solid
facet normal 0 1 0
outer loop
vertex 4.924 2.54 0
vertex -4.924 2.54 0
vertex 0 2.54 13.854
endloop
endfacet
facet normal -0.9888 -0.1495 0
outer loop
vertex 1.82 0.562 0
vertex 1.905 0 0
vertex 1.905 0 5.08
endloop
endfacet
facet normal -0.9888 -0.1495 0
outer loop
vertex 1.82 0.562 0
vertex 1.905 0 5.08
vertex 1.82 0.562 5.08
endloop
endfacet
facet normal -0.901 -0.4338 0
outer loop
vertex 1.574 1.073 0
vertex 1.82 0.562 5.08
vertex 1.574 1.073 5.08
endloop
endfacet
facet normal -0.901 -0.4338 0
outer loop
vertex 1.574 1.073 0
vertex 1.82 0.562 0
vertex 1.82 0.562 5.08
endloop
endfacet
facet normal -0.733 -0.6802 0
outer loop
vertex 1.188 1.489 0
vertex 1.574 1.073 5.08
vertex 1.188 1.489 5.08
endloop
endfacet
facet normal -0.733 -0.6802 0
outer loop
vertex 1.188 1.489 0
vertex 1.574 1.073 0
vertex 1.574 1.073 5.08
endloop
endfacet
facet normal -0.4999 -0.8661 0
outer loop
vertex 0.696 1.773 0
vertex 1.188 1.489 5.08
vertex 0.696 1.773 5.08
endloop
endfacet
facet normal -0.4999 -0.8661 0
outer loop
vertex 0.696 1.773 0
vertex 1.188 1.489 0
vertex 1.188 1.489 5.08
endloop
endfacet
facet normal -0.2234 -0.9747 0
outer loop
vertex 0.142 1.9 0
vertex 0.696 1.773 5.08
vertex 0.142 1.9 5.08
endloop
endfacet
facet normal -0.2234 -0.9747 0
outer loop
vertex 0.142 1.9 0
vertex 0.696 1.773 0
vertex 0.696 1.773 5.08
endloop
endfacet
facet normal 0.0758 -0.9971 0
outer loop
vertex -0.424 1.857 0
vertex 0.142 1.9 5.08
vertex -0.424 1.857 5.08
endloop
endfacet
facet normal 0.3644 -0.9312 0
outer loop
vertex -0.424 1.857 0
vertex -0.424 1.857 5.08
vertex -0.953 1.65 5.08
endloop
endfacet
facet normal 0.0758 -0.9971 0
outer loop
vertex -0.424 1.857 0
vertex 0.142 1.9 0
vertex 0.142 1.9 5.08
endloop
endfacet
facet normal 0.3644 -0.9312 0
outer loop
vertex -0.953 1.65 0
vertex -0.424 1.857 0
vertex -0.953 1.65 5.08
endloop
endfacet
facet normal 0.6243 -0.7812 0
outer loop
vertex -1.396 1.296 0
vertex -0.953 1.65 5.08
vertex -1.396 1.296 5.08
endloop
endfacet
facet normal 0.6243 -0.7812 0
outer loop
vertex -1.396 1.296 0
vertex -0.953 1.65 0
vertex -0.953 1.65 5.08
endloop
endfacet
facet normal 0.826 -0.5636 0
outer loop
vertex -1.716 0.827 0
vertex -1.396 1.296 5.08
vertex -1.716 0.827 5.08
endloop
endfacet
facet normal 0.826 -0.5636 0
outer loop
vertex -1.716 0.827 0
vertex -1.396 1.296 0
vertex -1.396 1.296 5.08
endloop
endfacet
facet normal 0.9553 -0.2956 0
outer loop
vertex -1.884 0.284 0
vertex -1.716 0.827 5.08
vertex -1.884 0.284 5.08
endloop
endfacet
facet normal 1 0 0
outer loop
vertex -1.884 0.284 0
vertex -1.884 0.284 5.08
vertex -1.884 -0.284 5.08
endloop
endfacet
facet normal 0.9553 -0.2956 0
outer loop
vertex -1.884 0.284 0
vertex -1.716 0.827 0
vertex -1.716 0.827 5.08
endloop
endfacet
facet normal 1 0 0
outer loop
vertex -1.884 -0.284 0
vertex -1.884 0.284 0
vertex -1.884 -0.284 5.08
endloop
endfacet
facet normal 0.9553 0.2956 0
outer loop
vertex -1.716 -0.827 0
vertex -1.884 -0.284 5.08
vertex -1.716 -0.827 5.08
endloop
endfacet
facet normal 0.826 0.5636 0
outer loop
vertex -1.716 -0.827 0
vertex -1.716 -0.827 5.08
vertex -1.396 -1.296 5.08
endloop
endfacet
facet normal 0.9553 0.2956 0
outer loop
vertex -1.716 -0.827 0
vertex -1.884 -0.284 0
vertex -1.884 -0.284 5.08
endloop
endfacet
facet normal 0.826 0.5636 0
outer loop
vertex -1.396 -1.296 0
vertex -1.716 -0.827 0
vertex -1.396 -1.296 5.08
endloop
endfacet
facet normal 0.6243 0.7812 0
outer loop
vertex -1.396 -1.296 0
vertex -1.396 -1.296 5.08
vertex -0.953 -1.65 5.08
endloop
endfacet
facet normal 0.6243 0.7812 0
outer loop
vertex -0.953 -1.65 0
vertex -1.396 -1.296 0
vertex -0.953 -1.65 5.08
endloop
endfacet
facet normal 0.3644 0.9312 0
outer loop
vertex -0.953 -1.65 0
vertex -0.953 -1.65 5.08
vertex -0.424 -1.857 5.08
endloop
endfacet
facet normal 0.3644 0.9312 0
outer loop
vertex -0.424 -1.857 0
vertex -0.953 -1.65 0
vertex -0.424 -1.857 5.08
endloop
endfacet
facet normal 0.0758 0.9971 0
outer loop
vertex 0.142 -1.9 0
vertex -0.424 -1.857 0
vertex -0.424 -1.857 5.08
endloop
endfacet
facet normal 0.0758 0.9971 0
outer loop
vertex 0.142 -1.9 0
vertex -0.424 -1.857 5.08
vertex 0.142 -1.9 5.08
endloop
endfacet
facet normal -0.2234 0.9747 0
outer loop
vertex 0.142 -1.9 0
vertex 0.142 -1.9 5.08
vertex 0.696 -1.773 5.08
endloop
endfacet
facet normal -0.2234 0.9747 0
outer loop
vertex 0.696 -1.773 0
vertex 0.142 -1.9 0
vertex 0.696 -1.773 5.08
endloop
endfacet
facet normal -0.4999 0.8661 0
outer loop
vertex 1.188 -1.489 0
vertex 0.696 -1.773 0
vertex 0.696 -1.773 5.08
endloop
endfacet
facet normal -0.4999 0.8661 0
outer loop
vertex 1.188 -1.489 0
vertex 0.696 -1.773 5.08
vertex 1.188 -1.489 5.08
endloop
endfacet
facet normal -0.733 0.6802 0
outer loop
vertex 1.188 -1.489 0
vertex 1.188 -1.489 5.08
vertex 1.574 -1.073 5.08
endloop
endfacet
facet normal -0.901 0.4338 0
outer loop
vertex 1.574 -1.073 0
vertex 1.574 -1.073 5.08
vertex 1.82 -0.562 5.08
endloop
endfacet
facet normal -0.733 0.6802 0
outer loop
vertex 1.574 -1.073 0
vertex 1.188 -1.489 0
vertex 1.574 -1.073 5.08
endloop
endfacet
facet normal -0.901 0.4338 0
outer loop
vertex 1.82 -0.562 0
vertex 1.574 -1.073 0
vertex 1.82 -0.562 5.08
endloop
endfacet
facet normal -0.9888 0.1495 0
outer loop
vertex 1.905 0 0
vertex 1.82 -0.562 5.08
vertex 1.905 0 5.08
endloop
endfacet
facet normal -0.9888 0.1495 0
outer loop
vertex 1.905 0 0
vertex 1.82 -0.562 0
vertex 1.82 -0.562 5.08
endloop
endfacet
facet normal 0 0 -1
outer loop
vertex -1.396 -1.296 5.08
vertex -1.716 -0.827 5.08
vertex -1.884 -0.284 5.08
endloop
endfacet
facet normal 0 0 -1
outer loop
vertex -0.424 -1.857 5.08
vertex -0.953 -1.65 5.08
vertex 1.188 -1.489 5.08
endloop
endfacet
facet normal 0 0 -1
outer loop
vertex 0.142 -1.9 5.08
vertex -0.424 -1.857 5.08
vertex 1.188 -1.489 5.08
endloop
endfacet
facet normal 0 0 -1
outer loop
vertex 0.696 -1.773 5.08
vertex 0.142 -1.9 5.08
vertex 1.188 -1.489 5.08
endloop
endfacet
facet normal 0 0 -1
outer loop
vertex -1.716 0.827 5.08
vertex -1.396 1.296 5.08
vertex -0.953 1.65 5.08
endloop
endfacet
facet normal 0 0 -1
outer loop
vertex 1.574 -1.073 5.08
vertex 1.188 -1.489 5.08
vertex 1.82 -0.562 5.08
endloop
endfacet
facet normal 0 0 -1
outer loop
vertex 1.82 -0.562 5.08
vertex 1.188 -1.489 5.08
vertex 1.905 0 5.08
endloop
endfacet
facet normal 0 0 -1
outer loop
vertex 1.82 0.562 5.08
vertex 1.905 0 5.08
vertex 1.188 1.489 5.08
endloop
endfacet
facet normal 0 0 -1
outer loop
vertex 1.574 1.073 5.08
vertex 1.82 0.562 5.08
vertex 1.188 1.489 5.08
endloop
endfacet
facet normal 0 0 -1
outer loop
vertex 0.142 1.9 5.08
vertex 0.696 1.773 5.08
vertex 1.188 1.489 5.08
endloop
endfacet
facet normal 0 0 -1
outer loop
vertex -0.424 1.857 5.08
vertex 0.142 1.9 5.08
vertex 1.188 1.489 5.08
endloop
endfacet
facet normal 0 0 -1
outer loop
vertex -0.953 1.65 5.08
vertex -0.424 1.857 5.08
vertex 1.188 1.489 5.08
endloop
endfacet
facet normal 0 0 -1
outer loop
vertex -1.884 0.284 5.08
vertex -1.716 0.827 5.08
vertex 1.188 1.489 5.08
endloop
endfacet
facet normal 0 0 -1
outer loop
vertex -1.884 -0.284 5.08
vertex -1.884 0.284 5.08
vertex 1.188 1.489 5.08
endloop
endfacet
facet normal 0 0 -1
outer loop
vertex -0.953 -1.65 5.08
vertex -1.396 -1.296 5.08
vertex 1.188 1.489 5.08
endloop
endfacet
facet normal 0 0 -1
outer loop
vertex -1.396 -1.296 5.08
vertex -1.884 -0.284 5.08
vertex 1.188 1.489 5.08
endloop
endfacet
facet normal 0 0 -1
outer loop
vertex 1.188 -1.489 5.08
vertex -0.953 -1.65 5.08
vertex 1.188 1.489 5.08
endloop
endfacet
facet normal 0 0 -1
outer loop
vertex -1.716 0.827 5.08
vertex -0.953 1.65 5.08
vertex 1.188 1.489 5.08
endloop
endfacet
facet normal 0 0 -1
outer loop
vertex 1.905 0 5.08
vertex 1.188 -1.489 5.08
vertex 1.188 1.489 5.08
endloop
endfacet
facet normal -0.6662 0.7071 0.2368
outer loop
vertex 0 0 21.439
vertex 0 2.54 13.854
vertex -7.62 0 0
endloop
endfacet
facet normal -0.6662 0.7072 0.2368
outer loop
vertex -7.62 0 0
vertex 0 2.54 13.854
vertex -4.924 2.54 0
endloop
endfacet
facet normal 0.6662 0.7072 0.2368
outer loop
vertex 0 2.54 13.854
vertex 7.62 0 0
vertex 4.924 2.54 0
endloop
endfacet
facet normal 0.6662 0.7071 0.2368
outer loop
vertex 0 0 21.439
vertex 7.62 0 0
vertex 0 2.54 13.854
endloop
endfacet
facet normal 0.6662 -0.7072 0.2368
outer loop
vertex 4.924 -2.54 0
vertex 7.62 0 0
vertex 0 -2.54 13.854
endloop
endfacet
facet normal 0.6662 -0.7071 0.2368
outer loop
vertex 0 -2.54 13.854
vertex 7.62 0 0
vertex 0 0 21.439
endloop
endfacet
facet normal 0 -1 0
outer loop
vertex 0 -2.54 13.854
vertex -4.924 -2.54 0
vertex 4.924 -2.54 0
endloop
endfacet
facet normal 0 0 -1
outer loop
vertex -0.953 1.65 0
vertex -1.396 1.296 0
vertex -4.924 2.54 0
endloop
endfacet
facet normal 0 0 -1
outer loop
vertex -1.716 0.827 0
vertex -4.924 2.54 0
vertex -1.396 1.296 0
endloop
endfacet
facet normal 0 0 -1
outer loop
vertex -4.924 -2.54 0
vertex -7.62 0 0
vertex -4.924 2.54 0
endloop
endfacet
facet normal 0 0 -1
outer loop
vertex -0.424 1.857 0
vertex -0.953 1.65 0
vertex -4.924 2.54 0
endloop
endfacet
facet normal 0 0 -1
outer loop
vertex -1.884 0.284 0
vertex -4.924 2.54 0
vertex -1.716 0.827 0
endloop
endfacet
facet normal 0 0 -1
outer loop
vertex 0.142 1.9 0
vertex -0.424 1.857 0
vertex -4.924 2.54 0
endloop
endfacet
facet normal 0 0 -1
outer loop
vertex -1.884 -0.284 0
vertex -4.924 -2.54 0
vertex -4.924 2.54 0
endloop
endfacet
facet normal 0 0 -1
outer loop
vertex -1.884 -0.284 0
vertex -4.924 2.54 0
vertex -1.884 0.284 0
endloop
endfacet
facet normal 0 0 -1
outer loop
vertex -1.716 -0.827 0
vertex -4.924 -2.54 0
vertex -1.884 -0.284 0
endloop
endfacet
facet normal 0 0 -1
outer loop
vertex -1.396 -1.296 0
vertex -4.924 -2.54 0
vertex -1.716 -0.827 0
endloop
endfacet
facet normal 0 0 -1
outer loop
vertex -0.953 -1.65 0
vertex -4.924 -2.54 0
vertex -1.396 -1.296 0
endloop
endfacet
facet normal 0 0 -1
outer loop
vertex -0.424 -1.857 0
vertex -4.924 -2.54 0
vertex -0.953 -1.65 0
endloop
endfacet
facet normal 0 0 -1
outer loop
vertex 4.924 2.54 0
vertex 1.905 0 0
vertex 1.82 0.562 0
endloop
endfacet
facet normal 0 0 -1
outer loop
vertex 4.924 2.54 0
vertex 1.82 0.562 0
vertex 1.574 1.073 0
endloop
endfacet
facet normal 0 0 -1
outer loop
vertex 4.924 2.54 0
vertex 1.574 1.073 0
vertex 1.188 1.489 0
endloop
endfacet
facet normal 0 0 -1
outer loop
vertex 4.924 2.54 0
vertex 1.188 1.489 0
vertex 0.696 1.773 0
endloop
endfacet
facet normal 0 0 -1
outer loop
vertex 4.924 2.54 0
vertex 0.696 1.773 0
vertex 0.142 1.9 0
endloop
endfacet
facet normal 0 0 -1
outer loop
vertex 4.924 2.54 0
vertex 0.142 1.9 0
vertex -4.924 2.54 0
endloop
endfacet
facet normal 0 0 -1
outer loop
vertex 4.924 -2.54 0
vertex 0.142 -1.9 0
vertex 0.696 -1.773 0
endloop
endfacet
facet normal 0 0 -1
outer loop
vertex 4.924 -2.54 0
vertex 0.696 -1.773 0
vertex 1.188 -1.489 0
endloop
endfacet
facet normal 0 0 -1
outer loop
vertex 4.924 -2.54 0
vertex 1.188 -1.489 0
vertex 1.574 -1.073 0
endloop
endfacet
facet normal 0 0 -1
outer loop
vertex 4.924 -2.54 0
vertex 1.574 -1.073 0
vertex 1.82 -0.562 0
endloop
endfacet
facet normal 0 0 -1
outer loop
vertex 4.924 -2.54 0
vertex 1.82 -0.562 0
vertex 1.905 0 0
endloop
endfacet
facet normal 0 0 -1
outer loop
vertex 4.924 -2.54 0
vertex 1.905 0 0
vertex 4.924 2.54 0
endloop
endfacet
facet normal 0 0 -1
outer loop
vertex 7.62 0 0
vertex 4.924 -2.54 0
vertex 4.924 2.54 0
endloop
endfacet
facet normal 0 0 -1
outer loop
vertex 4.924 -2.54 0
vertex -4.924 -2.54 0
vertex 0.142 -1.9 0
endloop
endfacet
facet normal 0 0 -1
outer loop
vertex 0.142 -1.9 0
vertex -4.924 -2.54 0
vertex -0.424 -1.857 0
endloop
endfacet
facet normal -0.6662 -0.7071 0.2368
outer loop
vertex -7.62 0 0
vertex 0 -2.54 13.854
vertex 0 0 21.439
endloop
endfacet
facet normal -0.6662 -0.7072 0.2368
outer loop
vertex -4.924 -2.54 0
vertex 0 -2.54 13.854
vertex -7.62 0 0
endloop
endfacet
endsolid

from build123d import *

# Parameters (mm, degrees)
F1_DEPTH      = 2.54
F1_DEPTH_BACK = 2.54
F2_R          = 1.905
F3_DEPTH      = 5.08
F4_SIZE       = 2.53999


# Not quite as in the source:
# - a fillet or chamfer is up to 0.001 mm smaller than in the source, because OpenCascade refuses the exact size


with BuildPart() as f1:
    # F0 (on Front) → F1 (new body, two sides)
    with BuildSketch(Plane.XZ) as f1_sk:
        Polygon((0, 21.4385549893), (-7.62, 0), (7.62, 0), align=None)
    extrude(amount=F1_DEPTH)
    extrude(f1_sk.sketch, amount=-F1_DEPTH_BACK)

    # F2 (on Top) → F3 (cut)
    with BuildSketch(Plane.XY):
        Circle(F2_R)
    extrude(amount=F3_DEPTH, mode=Mode.SUBTRACT)

    # F4 (size 2.54 in the source; OpenCascade refuses exactly that, so slightly less here)
    f4_edges = [f1.edges().sort_by_distance(p)[0] for p in [
        (3.81, -2.54, 10.719277),
        (-3.81, -2.54, 10.719277),
        (-3.81, 2.54, 10.719277),
        (3.81, 2.54, 10.719277),
    ]]
    chamfer(f4_edges, length=F4_SIZE)


solid = f1.part
